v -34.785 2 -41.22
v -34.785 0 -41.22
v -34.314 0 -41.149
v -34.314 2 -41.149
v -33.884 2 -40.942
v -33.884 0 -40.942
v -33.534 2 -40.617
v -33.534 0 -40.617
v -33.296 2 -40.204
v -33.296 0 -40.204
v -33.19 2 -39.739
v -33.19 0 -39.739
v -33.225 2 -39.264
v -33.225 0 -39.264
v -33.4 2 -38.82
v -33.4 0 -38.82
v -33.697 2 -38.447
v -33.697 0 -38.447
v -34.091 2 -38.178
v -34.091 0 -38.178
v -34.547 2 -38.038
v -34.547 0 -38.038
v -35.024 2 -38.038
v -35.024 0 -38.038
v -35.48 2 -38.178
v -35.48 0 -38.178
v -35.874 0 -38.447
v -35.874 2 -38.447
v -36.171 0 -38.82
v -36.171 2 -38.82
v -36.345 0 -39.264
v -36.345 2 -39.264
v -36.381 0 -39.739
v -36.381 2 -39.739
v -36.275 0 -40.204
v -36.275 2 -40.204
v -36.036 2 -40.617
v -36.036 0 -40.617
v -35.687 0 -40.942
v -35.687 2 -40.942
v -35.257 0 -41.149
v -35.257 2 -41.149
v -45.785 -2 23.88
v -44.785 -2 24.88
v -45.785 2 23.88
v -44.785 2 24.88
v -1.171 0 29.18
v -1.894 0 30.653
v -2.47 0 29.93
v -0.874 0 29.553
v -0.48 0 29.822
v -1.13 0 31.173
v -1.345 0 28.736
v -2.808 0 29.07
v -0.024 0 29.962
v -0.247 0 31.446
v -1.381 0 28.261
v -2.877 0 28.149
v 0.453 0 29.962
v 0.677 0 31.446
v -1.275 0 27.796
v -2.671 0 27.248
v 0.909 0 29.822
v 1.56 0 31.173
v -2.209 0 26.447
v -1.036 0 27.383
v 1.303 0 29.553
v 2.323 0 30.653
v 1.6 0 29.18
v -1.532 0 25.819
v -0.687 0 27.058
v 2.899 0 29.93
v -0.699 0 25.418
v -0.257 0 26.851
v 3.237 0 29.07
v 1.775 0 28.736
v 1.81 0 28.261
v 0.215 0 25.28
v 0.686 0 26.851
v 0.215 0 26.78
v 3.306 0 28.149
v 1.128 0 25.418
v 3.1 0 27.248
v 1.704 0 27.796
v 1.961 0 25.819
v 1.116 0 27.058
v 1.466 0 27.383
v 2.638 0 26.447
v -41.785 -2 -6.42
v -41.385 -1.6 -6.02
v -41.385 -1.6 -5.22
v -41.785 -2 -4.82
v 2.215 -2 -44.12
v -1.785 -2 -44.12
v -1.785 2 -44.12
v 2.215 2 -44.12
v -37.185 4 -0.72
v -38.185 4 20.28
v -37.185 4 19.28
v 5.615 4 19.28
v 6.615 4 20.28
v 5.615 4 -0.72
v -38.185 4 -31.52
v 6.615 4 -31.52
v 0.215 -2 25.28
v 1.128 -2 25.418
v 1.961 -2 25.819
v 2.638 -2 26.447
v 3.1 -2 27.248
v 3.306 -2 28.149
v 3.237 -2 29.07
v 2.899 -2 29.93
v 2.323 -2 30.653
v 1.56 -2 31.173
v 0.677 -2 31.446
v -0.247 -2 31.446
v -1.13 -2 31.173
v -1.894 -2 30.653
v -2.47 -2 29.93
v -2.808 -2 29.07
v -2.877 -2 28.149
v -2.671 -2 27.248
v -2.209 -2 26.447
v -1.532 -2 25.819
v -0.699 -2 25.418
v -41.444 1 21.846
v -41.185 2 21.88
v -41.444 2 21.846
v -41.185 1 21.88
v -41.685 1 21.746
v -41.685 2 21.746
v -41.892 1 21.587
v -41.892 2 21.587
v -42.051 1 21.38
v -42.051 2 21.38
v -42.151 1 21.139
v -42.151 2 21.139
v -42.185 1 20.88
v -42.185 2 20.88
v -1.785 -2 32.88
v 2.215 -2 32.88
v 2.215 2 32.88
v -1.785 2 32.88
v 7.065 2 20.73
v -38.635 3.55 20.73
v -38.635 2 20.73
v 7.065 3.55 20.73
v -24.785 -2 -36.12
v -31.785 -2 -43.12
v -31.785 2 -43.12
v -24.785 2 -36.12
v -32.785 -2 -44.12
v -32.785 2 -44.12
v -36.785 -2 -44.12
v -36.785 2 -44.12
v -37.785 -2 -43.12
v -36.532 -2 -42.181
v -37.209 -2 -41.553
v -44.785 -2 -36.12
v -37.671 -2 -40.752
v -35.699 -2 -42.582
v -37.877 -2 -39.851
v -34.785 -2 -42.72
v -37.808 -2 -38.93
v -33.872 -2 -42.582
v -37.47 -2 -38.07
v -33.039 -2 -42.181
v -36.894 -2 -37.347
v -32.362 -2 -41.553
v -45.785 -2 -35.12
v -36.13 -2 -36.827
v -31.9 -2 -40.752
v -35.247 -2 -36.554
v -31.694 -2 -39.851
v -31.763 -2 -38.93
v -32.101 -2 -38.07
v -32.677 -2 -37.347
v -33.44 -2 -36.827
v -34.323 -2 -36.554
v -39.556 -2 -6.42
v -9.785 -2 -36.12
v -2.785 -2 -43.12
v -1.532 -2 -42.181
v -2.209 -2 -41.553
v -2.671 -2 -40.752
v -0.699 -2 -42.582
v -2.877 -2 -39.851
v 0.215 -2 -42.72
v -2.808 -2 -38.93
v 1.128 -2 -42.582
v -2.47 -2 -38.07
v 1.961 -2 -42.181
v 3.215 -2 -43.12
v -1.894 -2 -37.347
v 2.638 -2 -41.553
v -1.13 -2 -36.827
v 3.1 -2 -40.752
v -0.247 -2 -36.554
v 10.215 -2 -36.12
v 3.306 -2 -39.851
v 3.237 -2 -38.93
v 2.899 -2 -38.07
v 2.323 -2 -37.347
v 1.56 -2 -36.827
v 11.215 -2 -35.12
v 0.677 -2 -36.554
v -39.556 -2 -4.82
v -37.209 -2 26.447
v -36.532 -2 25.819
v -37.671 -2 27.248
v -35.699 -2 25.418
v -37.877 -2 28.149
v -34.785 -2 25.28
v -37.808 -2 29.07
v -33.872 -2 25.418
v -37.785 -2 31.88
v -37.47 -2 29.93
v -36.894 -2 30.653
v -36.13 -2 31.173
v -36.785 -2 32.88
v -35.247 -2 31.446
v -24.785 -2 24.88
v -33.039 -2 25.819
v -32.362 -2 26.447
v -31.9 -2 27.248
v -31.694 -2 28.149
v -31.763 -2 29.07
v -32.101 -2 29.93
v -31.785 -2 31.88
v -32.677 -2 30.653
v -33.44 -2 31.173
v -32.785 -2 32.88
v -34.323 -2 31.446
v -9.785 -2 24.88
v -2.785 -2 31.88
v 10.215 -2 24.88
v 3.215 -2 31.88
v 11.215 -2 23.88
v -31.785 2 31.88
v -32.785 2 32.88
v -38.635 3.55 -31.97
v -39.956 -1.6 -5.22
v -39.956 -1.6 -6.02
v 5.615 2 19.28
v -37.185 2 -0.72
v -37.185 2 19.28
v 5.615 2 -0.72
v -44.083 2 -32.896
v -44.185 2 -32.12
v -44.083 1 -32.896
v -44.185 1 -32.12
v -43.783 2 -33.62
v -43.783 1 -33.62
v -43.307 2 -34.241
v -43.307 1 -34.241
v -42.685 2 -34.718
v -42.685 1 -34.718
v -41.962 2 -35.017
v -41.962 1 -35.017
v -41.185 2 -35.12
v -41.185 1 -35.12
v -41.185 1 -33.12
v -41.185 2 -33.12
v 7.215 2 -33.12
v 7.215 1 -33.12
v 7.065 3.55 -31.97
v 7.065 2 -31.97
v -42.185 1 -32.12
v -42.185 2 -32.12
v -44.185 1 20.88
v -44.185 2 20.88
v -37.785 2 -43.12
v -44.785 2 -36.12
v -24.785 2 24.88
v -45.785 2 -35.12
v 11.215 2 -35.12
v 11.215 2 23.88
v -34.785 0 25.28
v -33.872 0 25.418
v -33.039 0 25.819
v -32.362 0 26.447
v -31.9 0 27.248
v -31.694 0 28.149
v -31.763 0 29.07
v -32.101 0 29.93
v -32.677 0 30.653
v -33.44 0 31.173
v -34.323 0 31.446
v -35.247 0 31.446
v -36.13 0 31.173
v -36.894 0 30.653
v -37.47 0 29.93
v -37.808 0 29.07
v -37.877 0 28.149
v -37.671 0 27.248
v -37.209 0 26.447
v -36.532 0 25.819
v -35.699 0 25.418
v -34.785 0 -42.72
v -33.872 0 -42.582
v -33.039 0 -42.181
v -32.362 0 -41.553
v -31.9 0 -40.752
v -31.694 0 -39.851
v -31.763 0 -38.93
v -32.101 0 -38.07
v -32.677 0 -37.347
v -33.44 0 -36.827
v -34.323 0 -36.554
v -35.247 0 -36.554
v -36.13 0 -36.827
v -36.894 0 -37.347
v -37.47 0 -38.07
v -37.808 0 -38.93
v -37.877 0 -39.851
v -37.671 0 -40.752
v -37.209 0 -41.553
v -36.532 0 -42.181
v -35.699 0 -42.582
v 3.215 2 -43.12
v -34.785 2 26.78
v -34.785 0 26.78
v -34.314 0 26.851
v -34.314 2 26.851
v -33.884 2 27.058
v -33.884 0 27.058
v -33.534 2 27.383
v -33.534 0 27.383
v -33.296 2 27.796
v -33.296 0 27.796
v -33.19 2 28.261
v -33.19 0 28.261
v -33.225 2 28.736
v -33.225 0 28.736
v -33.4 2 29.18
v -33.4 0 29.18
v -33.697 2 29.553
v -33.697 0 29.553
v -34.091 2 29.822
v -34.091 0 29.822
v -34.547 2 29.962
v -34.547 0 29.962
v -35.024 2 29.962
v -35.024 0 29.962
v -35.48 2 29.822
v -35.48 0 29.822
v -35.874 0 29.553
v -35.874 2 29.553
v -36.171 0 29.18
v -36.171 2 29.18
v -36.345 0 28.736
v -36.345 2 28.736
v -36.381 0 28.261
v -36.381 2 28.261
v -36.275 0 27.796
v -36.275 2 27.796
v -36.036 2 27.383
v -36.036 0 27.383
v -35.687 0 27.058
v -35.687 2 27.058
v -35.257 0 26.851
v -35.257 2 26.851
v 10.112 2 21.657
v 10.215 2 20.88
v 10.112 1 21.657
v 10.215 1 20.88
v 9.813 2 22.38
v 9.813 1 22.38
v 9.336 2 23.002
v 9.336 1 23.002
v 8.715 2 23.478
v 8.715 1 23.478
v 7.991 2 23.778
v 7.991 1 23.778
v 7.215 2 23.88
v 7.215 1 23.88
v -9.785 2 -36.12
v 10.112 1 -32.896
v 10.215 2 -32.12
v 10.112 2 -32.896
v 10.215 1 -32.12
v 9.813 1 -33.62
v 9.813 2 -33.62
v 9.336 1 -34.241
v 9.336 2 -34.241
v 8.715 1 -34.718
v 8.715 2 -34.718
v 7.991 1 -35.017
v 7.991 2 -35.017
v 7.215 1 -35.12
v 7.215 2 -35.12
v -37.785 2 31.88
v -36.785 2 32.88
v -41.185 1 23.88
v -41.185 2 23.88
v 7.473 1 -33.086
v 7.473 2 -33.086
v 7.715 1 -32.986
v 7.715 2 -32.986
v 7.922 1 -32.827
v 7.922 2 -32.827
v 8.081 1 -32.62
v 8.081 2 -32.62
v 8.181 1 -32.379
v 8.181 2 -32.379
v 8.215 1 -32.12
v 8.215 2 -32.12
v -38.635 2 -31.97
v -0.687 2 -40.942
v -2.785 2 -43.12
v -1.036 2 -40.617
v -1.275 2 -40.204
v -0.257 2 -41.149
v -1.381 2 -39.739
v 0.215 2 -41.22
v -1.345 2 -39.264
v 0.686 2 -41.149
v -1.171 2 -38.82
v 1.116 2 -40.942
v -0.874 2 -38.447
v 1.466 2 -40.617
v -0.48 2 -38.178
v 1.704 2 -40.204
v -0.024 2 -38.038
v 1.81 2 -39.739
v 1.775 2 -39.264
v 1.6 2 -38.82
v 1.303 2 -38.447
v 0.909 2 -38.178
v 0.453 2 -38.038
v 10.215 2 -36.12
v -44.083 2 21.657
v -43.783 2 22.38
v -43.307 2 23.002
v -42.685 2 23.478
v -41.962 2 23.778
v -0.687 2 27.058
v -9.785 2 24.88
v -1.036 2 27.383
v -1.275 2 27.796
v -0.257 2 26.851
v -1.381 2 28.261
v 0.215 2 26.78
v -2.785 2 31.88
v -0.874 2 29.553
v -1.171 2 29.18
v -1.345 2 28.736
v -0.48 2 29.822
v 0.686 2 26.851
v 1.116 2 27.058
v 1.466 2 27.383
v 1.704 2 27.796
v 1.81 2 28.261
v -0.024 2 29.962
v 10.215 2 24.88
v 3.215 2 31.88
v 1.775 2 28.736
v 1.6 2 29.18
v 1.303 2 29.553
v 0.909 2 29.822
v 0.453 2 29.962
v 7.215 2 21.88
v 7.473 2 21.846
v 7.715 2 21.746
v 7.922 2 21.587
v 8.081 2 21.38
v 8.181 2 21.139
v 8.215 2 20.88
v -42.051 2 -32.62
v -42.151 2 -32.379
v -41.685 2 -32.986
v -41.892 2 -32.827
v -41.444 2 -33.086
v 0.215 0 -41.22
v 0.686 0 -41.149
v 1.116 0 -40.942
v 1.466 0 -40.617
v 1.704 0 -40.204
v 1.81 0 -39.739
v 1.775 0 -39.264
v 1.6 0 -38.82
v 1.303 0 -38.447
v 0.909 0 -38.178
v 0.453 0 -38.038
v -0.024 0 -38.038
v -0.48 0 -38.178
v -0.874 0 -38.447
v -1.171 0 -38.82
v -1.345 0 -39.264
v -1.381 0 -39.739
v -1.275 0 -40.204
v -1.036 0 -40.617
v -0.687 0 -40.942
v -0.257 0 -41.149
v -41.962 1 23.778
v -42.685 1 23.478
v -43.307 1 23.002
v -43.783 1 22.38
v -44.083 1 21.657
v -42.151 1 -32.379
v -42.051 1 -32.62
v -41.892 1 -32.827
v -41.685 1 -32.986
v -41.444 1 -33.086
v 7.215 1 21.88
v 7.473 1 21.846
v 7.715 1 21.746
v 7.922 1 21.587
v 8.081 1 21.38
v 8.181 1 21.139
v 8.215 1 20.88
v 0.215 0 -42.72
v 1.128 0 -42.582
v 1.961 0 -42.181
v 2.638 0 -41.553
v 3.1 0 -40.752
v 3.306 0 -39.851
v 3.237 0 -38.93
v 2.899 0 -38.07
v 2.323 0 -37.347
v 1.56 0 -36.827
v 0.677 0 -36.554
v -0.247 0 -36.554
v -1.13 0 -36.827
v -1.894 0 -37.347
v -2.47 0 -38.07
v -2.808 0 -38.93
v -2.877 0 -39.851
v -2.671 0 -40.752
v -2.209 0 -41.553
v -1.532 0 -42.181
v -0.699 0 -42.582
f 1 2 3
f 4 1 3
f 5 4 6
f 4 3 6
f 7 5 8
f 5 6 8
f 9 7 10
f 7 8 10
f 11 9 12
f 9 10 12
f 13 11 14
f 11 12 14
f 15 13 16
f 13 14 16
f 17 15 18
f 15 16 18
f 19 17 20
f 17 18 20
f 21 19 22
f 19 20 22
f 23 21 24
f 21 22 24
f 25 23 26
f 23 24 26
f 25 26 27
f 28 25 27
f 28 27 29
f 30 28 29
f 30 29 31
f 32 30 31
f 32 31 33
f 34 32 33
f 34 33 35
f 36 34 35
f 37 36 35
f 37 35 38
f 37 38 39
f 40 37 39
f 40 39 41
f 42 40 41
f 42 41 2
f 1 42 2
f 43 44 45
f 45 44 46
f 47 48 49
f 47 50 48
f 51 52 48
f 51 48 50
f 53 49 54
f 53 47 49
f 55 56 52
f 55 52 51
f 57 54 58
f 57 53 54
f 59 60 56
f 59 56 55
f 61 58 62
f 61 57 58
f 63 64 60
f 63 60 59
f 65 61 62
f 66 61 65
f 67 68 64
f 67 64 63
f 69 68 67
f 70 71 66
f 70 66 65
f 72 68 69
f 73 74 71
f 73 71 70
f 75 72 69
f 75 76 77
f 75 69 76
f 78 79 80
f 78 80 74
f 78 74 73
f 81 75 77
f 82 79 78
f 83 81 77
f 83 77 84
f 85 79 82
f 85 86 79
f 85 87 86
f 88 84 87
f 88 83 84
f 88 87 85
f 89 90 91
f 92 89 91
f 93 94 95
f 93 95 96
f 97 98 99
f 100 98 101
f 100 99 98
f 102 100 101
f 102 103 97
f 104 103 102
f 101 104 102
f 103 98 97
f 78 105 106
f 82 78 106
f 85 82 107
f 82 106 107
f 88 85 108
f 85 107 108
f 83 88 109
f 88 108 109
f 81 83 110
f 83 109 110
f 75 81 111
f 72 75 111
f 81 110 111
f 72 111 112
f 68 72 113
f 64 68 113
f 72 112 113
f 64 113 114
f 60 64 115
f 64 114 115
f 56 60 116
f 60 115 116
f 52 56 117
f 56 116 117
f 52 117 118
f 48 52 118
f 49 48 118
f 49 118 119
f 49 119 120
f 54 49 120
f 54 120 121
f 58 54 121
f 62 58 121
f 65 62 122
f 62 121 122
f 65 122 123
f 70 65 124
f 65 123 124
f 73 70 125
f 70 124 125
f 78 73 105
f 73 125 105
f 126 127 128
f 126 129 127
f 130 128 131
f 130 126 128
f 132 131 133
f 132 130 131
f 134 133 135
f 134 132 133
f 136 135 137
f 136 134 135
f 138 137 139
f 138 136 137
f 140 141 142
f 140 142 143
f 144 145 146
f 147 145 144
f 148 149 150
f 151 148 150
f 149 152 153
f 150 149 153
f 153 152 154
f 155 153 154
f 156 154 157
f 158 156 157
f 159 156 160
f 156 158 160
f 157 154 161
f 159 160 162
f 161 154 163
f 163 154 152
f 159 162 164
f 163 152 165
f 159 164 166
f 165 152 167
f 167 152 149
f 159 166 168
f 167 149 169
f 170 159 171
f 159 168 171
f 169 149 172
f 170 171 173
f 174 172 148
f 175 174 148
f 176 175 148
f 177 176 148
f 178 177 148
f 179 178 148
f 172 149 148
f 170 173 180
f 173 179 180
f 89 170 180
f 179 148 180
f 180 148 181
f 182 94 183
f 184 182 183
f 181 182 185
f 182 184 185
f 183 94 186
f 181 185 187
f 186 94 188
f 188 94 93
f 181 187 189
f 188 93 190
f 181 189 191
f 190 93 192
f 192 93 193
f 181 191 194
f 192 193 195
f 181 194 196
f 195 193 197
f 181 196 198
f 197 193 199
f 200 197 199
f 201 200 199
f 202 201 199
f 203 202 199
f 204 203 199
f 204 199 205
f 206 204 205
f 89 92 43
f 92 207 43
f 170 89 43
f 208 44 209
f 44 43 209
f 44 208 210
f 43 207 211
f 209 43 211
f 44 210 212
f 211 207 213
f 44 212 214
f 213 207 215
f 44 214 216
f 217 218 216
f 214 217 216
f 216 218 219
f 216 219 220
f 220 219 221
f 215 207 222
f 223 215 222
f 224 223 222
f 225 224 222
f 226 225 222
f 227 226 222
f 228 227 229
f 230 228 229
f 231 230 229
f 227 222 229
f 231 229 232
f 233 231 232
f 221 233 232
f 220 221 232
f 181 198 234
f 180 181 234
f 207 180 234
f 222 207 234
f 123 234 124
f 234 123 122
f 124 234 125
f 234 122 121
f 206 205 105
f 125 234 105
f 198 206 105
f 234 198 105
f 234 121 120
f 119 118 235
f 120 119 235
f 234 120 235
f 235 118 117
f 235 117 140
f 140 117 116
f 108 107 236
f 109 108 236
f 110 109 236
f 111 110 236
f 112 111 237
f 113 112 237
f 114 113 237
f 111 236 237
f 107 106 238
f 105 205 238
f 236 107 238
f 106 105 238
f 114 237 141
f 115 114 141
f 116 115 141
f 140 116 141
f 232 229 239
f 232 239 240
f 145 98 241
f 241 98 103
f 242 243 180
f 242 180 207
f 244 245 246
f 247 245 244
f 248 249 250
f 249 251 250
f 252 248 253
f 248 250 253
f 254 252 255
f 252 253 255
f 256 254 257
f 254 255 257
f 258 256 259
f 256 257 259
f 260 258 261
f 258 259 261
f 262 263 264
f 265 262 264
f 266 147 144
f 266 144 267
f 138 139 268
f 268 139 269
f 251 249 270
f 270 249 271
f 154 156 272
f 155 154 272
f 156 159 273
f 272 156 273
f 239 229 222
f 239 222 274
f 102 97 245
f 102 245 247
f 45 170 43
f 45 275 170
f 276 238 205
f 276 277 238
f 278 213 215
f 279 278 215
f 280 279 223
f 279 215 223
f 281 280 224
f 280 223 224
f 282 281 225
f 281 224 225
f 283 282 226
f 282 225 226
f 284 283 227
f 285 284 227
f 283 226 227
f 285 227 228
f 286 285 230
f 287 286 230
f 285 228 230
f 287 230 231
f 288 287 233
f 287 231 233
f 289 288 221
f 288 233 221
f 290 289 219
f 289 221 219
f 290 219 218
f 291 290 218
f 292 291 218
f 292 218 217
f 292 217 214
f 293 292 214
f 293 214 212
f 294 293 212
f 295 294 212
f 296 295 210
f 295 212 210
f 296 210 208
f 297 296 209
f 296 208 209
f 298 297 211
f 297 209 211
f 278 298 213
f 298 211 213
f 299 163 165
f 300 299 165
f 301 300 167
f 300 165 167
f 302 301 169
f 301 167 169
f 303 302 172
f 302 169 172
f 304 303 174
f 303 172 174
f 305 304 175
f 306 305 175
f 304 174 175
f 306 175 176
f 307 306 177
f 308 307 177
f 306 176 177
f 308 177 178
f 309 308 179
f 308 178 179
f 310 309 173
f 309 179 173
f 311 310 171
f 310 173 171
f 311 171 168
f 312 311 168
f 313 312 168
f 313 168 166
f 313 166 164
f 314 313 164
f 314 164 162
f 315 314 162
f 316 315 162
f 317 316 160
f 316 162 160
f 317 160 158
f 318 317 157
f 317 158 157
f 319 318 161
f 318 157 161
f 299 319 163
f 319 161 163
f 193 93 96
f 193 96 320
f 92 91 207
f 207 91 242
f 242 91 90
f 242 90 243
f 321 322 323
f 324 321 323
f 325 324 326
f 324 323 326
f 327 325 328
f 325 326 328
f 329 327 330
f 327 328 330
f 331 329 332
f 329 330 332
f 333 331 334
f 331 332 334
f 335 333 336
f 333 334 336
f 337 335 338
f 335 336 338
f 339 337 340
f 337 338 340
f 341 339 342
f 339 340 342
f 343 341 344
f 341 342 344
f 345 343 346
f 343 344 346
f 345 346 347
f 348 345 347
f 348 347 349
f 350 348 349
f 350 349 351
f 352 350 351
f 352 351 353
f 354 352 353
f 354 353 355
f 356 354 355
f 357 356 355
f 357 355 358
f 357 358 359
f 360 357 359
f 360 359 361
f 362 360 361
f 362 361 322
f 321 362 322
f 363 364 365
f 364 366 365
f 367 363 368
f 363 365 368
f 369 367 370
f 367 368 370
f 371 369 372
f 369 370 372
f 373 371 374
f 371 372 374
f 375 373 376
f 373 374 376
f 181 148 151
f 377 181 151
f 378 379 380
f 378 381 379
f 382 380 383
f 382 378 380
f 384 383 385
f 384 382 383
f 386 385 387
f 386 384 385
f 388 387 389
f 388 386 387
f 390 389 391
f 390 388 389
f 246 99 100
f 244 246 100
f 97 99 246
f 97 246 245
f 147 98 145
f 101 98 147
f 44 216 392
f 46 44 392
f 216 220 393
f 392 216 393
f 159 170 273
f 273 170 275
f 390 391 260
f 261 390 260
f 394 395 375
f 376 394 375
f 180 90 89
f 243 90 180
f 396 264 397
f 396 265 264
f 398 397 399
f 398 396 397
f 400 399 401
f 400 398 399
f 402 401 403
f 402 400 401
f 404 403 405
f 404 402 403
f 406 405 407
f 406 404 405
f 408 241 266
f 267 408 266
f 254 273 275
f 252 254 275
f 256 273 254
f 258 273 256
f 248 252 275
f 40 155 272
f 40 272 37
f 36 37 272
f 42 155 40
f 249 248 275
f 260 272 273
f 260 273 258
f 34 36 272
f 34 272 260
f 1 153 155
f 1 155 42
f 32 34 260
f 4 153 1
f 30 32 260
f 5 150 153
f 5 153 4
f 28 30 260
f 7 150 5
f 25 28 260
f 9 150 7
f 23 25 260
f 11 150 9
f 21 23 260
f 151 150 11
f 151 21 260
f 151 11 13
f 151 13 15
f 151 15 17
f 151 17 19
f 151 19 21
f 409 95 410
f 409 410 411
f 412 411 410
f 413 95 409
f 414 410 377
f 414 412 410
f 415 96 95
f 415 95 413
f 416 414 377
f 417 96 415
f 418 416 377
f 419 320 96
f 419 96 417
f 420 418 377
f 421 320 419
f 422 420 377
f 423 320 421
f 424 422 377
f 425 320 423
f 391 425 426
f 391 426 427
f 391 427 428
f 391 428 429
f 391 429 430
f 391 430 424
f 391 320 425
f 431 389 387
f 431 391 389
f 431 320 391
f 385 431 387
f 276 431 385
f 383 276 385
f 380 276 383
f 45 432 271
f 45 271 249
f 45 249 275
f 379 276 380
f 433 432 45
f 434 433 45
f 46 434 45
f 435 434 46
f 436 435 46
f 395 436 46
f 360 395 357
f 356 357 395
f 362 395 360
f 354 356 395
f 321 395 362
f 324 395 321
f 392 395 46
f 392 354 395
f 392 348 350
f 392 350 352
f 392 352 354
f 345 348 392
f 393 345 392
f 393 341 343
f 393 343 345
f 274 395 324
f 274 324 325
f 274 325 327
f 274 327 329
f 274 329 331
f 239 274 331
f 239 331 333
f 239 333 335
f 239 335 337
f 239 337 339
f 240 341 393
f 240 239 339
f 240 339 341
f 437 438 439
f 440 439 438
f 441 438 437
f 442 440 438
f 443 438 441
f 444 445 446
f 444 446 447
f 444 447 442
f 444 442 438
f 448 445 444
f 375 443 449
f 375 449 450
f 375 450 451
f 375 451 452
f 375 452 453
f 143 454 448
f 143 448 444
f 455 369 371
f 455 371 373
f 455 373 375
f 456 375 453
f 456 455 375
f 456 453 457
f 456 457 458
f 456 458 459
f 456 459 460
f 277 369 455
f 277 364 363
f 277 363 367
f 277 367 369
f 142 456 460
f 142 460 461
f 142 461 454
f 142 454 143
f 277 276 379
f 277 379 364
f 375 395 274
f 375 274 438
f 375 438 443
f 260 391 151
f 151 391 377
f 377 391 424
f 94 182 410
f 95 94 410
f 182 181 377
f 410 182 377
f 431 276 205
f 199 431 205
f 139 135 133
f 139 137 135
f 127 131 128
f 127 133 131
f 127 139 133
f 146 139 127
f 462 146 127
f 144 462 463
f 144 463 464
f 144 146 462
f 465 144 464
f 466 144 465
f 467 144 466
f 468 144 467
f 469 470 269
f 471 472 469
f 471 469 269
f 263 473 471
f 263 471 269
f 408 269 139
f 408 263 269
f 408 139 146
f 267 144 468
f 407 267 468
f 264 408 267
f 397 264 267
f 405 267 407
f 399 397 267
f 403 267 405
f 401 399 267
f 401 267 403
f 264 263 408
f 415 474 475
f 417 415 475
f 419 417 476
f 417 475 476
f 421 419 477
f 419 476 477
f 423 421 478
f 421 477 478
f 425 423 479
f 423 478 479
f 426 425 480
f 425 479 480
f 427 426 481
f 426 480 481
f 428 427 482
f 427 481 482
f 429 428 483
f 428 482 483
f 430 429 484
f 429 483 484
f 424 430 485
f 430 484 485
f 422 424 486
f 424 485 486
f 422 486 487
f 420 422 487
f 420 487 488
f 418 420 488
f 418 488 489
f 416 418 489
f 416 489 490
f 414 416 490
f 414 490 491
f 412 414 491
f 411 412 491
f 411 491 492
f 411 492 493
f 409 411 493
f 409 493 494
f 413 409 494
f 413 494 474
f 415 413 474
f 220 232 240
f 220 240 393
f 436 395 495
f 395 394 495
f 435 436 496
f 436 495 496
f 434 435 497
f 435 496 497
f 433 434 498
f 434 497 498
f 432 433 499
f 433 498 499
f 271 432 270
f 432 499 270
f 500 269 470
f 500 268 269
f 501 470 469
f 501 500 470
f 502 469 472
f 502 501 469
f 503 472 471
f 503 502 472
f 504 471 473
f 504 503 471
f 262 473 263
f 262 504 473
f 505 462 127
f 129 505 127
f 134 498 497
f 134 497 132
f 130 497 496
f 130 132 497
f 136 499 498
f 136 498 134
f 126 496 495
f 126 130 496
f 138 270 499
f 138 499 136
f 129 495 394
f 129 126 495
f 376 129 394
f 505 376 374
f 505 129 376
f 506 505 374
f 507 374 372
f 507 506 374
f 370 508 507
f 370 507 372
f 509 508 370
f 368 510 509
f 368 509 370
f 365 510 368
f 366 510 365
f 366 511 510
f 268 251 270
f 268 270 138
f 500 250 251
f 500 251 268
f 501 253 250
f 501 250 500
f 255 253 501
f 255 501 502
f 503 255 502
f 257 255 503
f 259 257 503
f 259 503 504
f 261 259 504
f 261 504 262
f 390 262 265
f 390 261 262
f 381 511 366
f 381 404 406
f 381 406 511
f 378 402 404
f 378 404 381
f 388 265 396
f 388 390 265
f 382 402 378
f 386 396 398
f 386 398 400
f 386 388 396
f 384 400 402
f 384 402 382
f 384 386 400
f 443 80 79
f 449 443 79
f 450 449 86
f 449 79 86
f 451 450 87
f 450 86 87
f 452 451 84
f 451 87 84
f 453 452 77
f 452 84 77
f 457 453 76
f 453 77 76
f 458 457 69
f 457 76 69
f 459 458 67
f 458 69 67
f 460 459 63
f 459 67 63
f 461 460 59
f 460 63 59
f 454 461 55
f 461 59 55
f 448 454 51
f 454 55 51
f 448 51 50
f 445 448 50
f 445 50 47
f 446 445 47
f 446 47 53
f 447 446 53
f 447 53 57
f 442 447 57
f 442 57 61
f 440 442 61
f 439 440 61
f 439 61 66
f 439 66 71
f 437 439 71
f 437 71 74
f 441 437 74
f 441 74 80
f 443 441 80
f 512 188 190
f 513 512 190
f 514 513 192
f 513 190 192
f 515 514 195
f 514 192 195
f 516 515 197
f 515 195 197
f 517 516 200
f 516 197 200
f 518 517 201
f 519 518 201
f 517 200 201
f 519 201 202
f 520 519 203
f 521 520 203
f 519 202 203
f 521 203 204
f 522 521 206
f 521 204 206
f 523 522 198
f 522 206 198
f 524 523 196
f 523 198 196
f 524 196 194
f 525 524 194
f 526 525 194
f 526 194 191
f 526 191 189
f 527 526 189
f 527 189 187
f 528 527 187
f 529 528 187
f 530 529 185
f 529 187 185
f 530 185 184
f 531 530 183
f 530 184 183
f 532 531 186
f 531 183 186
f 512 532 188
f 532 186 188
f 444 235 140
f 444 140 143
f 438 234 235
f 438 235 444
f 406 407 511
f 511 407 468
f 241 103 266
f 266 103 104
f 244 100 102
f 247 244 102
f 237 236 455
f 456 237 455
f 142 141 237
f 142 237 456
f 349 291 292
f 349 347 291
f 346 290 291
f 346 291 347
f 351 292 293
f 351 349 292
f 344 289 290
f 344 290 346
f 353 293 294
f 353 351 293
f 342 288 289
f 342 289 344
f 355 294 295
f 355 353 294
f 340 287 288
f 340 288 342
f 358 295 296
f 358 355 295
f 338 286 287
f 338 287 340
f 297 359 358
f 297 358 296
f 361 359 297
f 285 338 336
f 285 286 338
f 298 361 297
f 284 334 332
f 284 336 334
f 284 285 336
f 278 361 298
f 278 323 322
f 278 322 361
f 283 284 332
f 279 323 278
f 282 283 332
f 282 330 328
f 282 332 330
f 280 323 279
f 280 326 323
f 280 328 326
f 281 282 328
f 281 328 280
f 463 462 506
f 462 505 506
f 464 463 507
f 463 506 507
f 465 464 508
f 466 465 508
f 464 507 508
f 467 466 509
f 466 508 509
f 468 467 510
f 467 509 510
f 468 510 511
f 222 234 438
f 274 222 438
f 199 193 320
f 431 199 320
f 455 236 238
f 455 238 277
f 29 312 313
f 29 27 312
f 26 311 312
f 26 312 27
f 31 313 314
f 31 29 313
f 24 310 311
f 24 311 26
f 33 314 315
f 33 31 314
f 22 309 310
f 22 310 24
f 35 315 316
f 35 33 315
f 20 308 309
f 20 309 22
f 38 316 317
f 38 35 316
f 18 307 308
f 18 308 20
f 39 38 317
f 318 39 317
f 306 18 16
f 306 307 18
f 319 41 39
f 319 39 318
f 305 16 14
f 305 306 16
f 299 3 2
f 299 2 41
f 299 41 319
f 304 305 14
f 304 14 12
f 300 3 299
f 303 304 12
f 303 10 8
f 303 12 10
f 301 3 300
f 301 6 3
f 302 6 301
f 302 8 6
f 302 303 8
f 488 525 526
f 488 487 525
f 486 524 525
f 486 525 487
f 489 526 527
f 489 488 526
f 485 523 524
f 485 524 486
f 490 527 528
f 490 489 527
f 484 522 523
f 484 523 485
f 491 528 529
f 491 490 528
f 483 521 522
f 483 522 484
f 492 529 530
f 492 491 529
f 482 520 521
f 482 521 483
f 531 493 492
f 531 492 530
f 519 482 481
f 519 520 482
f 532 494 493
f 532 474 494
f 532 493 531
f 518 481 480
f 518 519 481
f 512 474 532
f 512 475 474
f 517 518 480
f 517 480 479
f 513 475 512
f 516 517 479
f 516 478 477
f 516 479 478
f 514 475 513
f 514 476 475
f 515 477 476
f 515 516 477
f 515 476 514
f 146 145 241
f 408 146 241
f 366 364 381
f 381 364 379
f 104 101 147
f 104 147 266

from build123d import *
from build123d.topology import SkipClean

# Parameters (mm, degrees)
SKETCH2_W           = 56
SKETCH2_H           = 61
BOSS_EXTRUDE1_DEPTH = 2
SKETCH3_W           = 46
SKETCH3_H           = 53
BOSS_EXTRUDE4_DEPTH = 2
SKETCH4_W           = 61
SKETCH4_H           = 4
BOSS_EXTRUDE5_DEPTH = 1
SKETCH5_W           = 6
SKETCH5_H           = 7
SKETCH5_R           = 1.6
BOSS_EXTRUDE7_DEPTH = 4
CUT_EXTRUDE1_DEPTH  = 1
CHAMFER1_SIZE       = 7
CHAMFER2_SIZE       = 7
CHAMFER3_SIZE       = 7
SKETCH11_R          = 3.1
CUT_EXTRUDE3_DEPTH  = 2
CHAMFER5_SIZE       = 1
BOSS_EXTRUDE8_DEPTH = 4
SKETCH13_W          = 45.8
SKETCH13_H          = 52.8
CUT_EXTRUDE4_DEPTH  = 2
CHAMFER6_SIZE       = 0.5
SKETCH14_W          = 2.229283504
SKETCH14_H          = 1.6
CUT_EXTRUDE5_DEPTH  = 0.4
CHAMFER7_SIZE       = 0.4
SKETCH15_W          = 42.8
SKETCH15_H          = 20
CUT_EXTRUDE6_DEPTH  = 2
SKETCH17_W          = 105.377924995
SKETCH17_H          = 90.385080266
SKETCH17_W_2        = 45.7
SKETCH17_H_2        = 52.7
CUT_EXTRUDE7_DEPTH  = 2
FILLET1_R           = 3
FILLET2_R           = 1


with BuildPart() as part:
    # Sketch2 → Boss-Extrude1 (new, symmetric)
    with BuildSketch(Plane(origin=(0, 0, 0), x_dir=(1, 0, 0), z_dir=(0, 1, 0))):
        with Locations((-16.78535262, 5.61968945)):
            Rectangle(SKETCH2_W, SKETCH2_H)
    extrude(amount=BOSS_EXTRUDE1_DEPTH, both=True)

    # Sketch3 → Boss-Extrude4 (add)
    with BuildSketch(Plane(origin=(0, 2, 0), x_dir=(1, 0, 0), z_dir=(0, 1, 0))):
        with Locations((-15.78535262, 5.61968945)):
            Rectangle(SKETCH3_W, SKETCH3_H)
    extrude(amount=BOSS_EXTRUDE4_DEPTH)

    # Sketch4 → Boss-Extrude5 (add)
    with BuildSketch(Plane.ZY.offset(44.78535262)):
        with Locations((-5.61968945, 0)):
            Rectangle(SKETCH4_W, SKETCH4_H)
    extrude(amount=BOSS_EXTRUDE5_DEPTH)

    # Sketch5 → Boss-Extrude7 (add)
    # profile 1 of 4: a face of its own
    with BuildSketch(Plane.XZ.offset(2)):
        with Locations((0.21464738, -39.61968945)):
            Rectangle(SKETCH5_W, SKETCH5_H)
        with Locations(Location((0.21464738, -39.61968945, 0), (0, 0, 270))):
            Circle(SKETCH5_R, mode=Mode.SUBTRACT)
    # profile 2 of 4: a face of its own
    with BuildSketch(Plane.XZ.offset(2)):
        with Locations((-34.78535262, -39.61968945)):
            Rectangle(SKETCH5_W, SKETCH5_H)
        with Locations(Location((-34.78535262, -39.61968945, 0), (0, 0, 270))):
            Circle(SKETCH5_R, mode=Mode.SUBTRACT)
    # profile 3 of 4: a face of its own
    with BuildSketch(Plane.XZ.offset(2)):
        with Locations((0.21464738, 28.38031055)):
            Rectangle(SKETCH5_W, SKETCH5_H)
        with Locations(Location((0.21464738, 28.38031055, 0), (0, 0, 270))):
            Circle(SKETCH5_R, mode=Mode.SUBTRACT)
    # profile 4 of 4: a face of its own
    with BuildSketch(Plane.XZ.offset(2)):
        with Locations((-34.78535262, 28.38031055)):
            Rectangle(SKETCH5_W, SKETCH5_H)
        with Locations(Location((-34.78535262, 28.38031055, 0), (0, 0, 270))):
            Circle(SKETCH5_R, mode=Mode.SUBTRACT)
    extrude(amount=-BOSS_EXTRUDE7_DEPTH)

    # Sketch10 → Cut-Extrude1 (cut)
    with BuildSketch(Plane(origin=(0, 2, 0), x_dir=(1, 0, 0), z_dir=(0, 1, 0))):
        Polygon((6.144593809, -23.88031055), (7.179875028, -23.88031055), (10.21464738, -23.88031055), (10.21464738, 33.074495481), (10.21464738, 35.11968945), (-41.065727012, 35.11968945), (-44.18535262, 35.11968945), (-44.18535262, -21.426384345), (-44.18535262, -23.88031055), align=None)
        Polygon((5.896683614, -21.88031055), (-42.18535262, -21.88031055), (-42.18535262, 33.11968945), (8.21464738, 33.11968945), (8.21464738, -21.88031055), align=None, mode=Mode.SUBTRACT)
    extrude(amount=-CUT_EXTRUDE1_DEPTH, mode=Mode.SUBTRACT)

    # Chamfer1
    chamfer1_edges = [part.edges().sort_by_distance(p)[0] for p in [
        (3.21464738, 0, -36.11968945),
    ]]
    chamfer(chamfer1_edges, length=CHAMFER1_SIZE - 0.0001)  # a hair under: the kernel refuses the full size

    # Chamfer2
    chamfer2_edges = [part.edges().sort_by_distance(p)[0] for p in [
        (-2.78535262, 0, -36.11968945),
    ]]
    chamfer(chamfer2_edges, length=CHAMFER2_SIZE - 0.0001)  # a hair under: the kernel refuses the full size

    # Chamfer3
    chamfer3_edges = [part.edges().sort_by_distance(p)[0] for p in [
        (-37.78535262, 0, -36.11968945),
        (-31.78535262, 0, -36.11968945),
        (3.21464738, 0, 24.88031055),
        (-2.78535262, 0, 24.88031055),
        (-37.78535262, 0, 24.88031055),
        (-31.78535262, 0, 24.88031055),
    ]]
    chamfer(chamfer3_edges, length=CHAMFER3_SIZE - 0.0001)  # a hair under: the kernel refuses the full size

    # Sketch11 → Cut-Extrude3 (cut)
    with BuildSketch(Plane.XZ.offset(2)):
        with Locations(Location((-34.78535262, 28.38031055, 0), (0, 0, 270))):
            Circle(SKETCH11_R)
        with Locations(Location((0.21464738, 28.38031055, 0), (0, 0, 270))):
            Circle(SKETCH11_R)
        with Locations(Location((0.21464738, -39.61968945, 0), (0, 0, 270))):
            Circle(SKETCH11_R)
        with Locations(Location((-34.78535262, -39.61968945, 0), (0, 0, 270))):
            Circle(SKETCH11_R)
    extrude(amount=-CUT_EXTRUDE3_DEPTH, mode=Mode.SUBTRACT)

    # Chamfer5
    chamfer5_edges = [part.edges().sort_by_distance(p)[0] for p in [
        (-45.78535262, 0, -36.11968945),
        (-45.78535262, 0, 24.88031055),
        (11.21464738, 0, -36.11968945),
        (11.21464738, 0, 24.88031055),
    ]]
    chamfer(chamfer5_edges, length=CHAMFER5_SIZE)

    # Sketch12 → Boss-Extrude8 (add)
    with SkipClean():  # the faces are left unmerged after this step: merging them gives an invalid solid
        with BuildSketch(Plane.XZ.offset(2)):
            Polygon((-31.78535262, 31.88031055), (-32.78535262, 32.88031055), (-36.78535262, 32.88031055), (-37.78535262, 31.88031055), align=None)
            Polygon((3.21464738, 31.88031055), (2.21464738, 32.88031055), (-1.78535262, 32.88031055), (-2.78535262, 31.88031055), align=None)
            Polygon((-2.78535262, -43.11968945), (-1.78535262, -44.11968945), (-1.009776474, -44.11968945), (2.21464738, -44.11968945), (3.21464738, -43.11968945), align=None)
            Polygon((-31.78535262, -43.11968945), (-32.78535262, -44.11968945), (-36.78535262, -44.11968945), (-37.78535262, -43.11968945), align=None)
        extrude(amount=-BOSS_EXTRUDE8_DEPTH)

    # Sketch13 → Cut-Extrude4 (cut)
    with SkipClean():  # the faces are left unmerged after this step: merging them gives an invalid solid
        with BuildSketch(Plane(origin=(0, 4, 0), x_dir=(1, 0, 0), z_dir=(0, 1, 0))):
            Polygon((-38.78535262, -20.88031055), (-38.68535262, -20.88031055), (7.21464738, -20.88031055), (7.21464738, -20.78031055), (7.21464738, 32.01968945), (7.21464738, 32.11968945), (-38.68535262, 32.11968945), (-38.78535262, 32.11968945), align=None)
            with Locations((-15.78535262, 5.61968945)):
                Rectangle(SKETCH13_W, SKETCH13_H, mode=Mode.SUBTRACT)
        extrude(amount=-CUT_EXTRUDE4_DEPTH, mode=Mode.SUBTRACT)

    # Chamfer6
    chamfer6_edges = [part.edges().sort_by_distance(p)[0] for p in [
        (-15.78535262, 4, 20.78031055),
        (-38.68535262, 4, -5.61968945),
        (-15.78535262, 4, -32.01968945),
        (7.11464738, 4, -5.61968945),
    ]]
    chamfer(chamfer6_edges, length=CHAMFER6_SIZE)

    # Sketch14 → Cut-Extrude5 (cut)
    with SkipClean():  # the faces are left unmerged after this step: merging them gives an invalid solid
        with BuildSketch(Plane.XZ.offset(2)):
            with Locations((-40.670710868, -5.61968945)):
                Rectangle(SKETCH14_W, SKETCH14_H)
        extrude(amount=-CUT_EXTRUDE5_DEPTH, mode=Mode.SUBTRACT)

    # Chamfer7
    chamfer7_edges = [part.edges().sort_by_distance(p)[0] for p in [
        (-40.670710868, -1.6, -4.81968945),
        (-39.556069116, -1.6, -5.61968945),
        (-40.670710868, -1.6, -6.41968945),
        (-41.78535262, -1.6, -5.61968945),
    ]]
    chamfer(chamfer7_edges, length=CHAMFER7_SIZE - 0.0001)  # a hair under: the kernel refuses the full size

    # Sketch15 → Cut-Extrude6 (cut)
    with SkipClean():  # the faces are left unmerged after this step: merging them gives an invalid solid
        with BuildSketch(Plane(origin=(0, 4, 0), x_dir=(1, 0, 0), z_dir=(0, 1, 0))):
            with Locations((-15.78535262, -9.28031055)):
                Rectangle(SKETCH15_W, SKETCH15_H)
        extrude(amount=-CUT_EXTRUDE6_DEPTH, mode=Mode.SUBTRACT)

    # Sketch17 → Cut-Extrude7 (cut)
    with SkipClean():  # the faces are left unmerged after this step: merging them gives an invalid solid
        with BuildSketch(Plane(origin=(0, 4, 0), x_dir=(1, 0, 0), z_dir=(0, 1, 0))):
            with Locations((-12.998639351, 5.588523168)):
                Rectangle(SKETCH17_W, SKETCH17_H)
            with Locations((-15.78535262, 5.61968945)):
                Rectangle(SKETCH17_W_2, SKETCH17_H_2, mode=Mode.SUBTRACT)
        extrude(amount=-CUT_EXTRUDE7_DEPTH, mode=Mode.SUBTRACT)

    # Fillet1
    fillet1_edges = [part.edges().sort_by_distance(p)[0] for p in [
        (-44.18535262, 1.5, 23.88031055),
        (-44.18535262, 1.5, -35.11968945),
        (10.21464738, 1.5, -35.11968945),
        (10.21464738, 1.5, 23.88031055),
    ]]
    fillet(fillet1_edges, radius=FILLET1_R)

    # Fillet2
    fillet2_edges = [part.edges().sort_by_distance(p)[0] for p in [
        (-42.18535262, 1.5, 21.88031055),
        (-42.18535262, 1.5, -33.11968945),
        (8.21464738, 1.5, -33.11968945),
        (8.21464738, 1.5, 21.88031055),
    ]]
    fillet(fillet2_edges, radius=FILLET2_R)


solid = part.part
